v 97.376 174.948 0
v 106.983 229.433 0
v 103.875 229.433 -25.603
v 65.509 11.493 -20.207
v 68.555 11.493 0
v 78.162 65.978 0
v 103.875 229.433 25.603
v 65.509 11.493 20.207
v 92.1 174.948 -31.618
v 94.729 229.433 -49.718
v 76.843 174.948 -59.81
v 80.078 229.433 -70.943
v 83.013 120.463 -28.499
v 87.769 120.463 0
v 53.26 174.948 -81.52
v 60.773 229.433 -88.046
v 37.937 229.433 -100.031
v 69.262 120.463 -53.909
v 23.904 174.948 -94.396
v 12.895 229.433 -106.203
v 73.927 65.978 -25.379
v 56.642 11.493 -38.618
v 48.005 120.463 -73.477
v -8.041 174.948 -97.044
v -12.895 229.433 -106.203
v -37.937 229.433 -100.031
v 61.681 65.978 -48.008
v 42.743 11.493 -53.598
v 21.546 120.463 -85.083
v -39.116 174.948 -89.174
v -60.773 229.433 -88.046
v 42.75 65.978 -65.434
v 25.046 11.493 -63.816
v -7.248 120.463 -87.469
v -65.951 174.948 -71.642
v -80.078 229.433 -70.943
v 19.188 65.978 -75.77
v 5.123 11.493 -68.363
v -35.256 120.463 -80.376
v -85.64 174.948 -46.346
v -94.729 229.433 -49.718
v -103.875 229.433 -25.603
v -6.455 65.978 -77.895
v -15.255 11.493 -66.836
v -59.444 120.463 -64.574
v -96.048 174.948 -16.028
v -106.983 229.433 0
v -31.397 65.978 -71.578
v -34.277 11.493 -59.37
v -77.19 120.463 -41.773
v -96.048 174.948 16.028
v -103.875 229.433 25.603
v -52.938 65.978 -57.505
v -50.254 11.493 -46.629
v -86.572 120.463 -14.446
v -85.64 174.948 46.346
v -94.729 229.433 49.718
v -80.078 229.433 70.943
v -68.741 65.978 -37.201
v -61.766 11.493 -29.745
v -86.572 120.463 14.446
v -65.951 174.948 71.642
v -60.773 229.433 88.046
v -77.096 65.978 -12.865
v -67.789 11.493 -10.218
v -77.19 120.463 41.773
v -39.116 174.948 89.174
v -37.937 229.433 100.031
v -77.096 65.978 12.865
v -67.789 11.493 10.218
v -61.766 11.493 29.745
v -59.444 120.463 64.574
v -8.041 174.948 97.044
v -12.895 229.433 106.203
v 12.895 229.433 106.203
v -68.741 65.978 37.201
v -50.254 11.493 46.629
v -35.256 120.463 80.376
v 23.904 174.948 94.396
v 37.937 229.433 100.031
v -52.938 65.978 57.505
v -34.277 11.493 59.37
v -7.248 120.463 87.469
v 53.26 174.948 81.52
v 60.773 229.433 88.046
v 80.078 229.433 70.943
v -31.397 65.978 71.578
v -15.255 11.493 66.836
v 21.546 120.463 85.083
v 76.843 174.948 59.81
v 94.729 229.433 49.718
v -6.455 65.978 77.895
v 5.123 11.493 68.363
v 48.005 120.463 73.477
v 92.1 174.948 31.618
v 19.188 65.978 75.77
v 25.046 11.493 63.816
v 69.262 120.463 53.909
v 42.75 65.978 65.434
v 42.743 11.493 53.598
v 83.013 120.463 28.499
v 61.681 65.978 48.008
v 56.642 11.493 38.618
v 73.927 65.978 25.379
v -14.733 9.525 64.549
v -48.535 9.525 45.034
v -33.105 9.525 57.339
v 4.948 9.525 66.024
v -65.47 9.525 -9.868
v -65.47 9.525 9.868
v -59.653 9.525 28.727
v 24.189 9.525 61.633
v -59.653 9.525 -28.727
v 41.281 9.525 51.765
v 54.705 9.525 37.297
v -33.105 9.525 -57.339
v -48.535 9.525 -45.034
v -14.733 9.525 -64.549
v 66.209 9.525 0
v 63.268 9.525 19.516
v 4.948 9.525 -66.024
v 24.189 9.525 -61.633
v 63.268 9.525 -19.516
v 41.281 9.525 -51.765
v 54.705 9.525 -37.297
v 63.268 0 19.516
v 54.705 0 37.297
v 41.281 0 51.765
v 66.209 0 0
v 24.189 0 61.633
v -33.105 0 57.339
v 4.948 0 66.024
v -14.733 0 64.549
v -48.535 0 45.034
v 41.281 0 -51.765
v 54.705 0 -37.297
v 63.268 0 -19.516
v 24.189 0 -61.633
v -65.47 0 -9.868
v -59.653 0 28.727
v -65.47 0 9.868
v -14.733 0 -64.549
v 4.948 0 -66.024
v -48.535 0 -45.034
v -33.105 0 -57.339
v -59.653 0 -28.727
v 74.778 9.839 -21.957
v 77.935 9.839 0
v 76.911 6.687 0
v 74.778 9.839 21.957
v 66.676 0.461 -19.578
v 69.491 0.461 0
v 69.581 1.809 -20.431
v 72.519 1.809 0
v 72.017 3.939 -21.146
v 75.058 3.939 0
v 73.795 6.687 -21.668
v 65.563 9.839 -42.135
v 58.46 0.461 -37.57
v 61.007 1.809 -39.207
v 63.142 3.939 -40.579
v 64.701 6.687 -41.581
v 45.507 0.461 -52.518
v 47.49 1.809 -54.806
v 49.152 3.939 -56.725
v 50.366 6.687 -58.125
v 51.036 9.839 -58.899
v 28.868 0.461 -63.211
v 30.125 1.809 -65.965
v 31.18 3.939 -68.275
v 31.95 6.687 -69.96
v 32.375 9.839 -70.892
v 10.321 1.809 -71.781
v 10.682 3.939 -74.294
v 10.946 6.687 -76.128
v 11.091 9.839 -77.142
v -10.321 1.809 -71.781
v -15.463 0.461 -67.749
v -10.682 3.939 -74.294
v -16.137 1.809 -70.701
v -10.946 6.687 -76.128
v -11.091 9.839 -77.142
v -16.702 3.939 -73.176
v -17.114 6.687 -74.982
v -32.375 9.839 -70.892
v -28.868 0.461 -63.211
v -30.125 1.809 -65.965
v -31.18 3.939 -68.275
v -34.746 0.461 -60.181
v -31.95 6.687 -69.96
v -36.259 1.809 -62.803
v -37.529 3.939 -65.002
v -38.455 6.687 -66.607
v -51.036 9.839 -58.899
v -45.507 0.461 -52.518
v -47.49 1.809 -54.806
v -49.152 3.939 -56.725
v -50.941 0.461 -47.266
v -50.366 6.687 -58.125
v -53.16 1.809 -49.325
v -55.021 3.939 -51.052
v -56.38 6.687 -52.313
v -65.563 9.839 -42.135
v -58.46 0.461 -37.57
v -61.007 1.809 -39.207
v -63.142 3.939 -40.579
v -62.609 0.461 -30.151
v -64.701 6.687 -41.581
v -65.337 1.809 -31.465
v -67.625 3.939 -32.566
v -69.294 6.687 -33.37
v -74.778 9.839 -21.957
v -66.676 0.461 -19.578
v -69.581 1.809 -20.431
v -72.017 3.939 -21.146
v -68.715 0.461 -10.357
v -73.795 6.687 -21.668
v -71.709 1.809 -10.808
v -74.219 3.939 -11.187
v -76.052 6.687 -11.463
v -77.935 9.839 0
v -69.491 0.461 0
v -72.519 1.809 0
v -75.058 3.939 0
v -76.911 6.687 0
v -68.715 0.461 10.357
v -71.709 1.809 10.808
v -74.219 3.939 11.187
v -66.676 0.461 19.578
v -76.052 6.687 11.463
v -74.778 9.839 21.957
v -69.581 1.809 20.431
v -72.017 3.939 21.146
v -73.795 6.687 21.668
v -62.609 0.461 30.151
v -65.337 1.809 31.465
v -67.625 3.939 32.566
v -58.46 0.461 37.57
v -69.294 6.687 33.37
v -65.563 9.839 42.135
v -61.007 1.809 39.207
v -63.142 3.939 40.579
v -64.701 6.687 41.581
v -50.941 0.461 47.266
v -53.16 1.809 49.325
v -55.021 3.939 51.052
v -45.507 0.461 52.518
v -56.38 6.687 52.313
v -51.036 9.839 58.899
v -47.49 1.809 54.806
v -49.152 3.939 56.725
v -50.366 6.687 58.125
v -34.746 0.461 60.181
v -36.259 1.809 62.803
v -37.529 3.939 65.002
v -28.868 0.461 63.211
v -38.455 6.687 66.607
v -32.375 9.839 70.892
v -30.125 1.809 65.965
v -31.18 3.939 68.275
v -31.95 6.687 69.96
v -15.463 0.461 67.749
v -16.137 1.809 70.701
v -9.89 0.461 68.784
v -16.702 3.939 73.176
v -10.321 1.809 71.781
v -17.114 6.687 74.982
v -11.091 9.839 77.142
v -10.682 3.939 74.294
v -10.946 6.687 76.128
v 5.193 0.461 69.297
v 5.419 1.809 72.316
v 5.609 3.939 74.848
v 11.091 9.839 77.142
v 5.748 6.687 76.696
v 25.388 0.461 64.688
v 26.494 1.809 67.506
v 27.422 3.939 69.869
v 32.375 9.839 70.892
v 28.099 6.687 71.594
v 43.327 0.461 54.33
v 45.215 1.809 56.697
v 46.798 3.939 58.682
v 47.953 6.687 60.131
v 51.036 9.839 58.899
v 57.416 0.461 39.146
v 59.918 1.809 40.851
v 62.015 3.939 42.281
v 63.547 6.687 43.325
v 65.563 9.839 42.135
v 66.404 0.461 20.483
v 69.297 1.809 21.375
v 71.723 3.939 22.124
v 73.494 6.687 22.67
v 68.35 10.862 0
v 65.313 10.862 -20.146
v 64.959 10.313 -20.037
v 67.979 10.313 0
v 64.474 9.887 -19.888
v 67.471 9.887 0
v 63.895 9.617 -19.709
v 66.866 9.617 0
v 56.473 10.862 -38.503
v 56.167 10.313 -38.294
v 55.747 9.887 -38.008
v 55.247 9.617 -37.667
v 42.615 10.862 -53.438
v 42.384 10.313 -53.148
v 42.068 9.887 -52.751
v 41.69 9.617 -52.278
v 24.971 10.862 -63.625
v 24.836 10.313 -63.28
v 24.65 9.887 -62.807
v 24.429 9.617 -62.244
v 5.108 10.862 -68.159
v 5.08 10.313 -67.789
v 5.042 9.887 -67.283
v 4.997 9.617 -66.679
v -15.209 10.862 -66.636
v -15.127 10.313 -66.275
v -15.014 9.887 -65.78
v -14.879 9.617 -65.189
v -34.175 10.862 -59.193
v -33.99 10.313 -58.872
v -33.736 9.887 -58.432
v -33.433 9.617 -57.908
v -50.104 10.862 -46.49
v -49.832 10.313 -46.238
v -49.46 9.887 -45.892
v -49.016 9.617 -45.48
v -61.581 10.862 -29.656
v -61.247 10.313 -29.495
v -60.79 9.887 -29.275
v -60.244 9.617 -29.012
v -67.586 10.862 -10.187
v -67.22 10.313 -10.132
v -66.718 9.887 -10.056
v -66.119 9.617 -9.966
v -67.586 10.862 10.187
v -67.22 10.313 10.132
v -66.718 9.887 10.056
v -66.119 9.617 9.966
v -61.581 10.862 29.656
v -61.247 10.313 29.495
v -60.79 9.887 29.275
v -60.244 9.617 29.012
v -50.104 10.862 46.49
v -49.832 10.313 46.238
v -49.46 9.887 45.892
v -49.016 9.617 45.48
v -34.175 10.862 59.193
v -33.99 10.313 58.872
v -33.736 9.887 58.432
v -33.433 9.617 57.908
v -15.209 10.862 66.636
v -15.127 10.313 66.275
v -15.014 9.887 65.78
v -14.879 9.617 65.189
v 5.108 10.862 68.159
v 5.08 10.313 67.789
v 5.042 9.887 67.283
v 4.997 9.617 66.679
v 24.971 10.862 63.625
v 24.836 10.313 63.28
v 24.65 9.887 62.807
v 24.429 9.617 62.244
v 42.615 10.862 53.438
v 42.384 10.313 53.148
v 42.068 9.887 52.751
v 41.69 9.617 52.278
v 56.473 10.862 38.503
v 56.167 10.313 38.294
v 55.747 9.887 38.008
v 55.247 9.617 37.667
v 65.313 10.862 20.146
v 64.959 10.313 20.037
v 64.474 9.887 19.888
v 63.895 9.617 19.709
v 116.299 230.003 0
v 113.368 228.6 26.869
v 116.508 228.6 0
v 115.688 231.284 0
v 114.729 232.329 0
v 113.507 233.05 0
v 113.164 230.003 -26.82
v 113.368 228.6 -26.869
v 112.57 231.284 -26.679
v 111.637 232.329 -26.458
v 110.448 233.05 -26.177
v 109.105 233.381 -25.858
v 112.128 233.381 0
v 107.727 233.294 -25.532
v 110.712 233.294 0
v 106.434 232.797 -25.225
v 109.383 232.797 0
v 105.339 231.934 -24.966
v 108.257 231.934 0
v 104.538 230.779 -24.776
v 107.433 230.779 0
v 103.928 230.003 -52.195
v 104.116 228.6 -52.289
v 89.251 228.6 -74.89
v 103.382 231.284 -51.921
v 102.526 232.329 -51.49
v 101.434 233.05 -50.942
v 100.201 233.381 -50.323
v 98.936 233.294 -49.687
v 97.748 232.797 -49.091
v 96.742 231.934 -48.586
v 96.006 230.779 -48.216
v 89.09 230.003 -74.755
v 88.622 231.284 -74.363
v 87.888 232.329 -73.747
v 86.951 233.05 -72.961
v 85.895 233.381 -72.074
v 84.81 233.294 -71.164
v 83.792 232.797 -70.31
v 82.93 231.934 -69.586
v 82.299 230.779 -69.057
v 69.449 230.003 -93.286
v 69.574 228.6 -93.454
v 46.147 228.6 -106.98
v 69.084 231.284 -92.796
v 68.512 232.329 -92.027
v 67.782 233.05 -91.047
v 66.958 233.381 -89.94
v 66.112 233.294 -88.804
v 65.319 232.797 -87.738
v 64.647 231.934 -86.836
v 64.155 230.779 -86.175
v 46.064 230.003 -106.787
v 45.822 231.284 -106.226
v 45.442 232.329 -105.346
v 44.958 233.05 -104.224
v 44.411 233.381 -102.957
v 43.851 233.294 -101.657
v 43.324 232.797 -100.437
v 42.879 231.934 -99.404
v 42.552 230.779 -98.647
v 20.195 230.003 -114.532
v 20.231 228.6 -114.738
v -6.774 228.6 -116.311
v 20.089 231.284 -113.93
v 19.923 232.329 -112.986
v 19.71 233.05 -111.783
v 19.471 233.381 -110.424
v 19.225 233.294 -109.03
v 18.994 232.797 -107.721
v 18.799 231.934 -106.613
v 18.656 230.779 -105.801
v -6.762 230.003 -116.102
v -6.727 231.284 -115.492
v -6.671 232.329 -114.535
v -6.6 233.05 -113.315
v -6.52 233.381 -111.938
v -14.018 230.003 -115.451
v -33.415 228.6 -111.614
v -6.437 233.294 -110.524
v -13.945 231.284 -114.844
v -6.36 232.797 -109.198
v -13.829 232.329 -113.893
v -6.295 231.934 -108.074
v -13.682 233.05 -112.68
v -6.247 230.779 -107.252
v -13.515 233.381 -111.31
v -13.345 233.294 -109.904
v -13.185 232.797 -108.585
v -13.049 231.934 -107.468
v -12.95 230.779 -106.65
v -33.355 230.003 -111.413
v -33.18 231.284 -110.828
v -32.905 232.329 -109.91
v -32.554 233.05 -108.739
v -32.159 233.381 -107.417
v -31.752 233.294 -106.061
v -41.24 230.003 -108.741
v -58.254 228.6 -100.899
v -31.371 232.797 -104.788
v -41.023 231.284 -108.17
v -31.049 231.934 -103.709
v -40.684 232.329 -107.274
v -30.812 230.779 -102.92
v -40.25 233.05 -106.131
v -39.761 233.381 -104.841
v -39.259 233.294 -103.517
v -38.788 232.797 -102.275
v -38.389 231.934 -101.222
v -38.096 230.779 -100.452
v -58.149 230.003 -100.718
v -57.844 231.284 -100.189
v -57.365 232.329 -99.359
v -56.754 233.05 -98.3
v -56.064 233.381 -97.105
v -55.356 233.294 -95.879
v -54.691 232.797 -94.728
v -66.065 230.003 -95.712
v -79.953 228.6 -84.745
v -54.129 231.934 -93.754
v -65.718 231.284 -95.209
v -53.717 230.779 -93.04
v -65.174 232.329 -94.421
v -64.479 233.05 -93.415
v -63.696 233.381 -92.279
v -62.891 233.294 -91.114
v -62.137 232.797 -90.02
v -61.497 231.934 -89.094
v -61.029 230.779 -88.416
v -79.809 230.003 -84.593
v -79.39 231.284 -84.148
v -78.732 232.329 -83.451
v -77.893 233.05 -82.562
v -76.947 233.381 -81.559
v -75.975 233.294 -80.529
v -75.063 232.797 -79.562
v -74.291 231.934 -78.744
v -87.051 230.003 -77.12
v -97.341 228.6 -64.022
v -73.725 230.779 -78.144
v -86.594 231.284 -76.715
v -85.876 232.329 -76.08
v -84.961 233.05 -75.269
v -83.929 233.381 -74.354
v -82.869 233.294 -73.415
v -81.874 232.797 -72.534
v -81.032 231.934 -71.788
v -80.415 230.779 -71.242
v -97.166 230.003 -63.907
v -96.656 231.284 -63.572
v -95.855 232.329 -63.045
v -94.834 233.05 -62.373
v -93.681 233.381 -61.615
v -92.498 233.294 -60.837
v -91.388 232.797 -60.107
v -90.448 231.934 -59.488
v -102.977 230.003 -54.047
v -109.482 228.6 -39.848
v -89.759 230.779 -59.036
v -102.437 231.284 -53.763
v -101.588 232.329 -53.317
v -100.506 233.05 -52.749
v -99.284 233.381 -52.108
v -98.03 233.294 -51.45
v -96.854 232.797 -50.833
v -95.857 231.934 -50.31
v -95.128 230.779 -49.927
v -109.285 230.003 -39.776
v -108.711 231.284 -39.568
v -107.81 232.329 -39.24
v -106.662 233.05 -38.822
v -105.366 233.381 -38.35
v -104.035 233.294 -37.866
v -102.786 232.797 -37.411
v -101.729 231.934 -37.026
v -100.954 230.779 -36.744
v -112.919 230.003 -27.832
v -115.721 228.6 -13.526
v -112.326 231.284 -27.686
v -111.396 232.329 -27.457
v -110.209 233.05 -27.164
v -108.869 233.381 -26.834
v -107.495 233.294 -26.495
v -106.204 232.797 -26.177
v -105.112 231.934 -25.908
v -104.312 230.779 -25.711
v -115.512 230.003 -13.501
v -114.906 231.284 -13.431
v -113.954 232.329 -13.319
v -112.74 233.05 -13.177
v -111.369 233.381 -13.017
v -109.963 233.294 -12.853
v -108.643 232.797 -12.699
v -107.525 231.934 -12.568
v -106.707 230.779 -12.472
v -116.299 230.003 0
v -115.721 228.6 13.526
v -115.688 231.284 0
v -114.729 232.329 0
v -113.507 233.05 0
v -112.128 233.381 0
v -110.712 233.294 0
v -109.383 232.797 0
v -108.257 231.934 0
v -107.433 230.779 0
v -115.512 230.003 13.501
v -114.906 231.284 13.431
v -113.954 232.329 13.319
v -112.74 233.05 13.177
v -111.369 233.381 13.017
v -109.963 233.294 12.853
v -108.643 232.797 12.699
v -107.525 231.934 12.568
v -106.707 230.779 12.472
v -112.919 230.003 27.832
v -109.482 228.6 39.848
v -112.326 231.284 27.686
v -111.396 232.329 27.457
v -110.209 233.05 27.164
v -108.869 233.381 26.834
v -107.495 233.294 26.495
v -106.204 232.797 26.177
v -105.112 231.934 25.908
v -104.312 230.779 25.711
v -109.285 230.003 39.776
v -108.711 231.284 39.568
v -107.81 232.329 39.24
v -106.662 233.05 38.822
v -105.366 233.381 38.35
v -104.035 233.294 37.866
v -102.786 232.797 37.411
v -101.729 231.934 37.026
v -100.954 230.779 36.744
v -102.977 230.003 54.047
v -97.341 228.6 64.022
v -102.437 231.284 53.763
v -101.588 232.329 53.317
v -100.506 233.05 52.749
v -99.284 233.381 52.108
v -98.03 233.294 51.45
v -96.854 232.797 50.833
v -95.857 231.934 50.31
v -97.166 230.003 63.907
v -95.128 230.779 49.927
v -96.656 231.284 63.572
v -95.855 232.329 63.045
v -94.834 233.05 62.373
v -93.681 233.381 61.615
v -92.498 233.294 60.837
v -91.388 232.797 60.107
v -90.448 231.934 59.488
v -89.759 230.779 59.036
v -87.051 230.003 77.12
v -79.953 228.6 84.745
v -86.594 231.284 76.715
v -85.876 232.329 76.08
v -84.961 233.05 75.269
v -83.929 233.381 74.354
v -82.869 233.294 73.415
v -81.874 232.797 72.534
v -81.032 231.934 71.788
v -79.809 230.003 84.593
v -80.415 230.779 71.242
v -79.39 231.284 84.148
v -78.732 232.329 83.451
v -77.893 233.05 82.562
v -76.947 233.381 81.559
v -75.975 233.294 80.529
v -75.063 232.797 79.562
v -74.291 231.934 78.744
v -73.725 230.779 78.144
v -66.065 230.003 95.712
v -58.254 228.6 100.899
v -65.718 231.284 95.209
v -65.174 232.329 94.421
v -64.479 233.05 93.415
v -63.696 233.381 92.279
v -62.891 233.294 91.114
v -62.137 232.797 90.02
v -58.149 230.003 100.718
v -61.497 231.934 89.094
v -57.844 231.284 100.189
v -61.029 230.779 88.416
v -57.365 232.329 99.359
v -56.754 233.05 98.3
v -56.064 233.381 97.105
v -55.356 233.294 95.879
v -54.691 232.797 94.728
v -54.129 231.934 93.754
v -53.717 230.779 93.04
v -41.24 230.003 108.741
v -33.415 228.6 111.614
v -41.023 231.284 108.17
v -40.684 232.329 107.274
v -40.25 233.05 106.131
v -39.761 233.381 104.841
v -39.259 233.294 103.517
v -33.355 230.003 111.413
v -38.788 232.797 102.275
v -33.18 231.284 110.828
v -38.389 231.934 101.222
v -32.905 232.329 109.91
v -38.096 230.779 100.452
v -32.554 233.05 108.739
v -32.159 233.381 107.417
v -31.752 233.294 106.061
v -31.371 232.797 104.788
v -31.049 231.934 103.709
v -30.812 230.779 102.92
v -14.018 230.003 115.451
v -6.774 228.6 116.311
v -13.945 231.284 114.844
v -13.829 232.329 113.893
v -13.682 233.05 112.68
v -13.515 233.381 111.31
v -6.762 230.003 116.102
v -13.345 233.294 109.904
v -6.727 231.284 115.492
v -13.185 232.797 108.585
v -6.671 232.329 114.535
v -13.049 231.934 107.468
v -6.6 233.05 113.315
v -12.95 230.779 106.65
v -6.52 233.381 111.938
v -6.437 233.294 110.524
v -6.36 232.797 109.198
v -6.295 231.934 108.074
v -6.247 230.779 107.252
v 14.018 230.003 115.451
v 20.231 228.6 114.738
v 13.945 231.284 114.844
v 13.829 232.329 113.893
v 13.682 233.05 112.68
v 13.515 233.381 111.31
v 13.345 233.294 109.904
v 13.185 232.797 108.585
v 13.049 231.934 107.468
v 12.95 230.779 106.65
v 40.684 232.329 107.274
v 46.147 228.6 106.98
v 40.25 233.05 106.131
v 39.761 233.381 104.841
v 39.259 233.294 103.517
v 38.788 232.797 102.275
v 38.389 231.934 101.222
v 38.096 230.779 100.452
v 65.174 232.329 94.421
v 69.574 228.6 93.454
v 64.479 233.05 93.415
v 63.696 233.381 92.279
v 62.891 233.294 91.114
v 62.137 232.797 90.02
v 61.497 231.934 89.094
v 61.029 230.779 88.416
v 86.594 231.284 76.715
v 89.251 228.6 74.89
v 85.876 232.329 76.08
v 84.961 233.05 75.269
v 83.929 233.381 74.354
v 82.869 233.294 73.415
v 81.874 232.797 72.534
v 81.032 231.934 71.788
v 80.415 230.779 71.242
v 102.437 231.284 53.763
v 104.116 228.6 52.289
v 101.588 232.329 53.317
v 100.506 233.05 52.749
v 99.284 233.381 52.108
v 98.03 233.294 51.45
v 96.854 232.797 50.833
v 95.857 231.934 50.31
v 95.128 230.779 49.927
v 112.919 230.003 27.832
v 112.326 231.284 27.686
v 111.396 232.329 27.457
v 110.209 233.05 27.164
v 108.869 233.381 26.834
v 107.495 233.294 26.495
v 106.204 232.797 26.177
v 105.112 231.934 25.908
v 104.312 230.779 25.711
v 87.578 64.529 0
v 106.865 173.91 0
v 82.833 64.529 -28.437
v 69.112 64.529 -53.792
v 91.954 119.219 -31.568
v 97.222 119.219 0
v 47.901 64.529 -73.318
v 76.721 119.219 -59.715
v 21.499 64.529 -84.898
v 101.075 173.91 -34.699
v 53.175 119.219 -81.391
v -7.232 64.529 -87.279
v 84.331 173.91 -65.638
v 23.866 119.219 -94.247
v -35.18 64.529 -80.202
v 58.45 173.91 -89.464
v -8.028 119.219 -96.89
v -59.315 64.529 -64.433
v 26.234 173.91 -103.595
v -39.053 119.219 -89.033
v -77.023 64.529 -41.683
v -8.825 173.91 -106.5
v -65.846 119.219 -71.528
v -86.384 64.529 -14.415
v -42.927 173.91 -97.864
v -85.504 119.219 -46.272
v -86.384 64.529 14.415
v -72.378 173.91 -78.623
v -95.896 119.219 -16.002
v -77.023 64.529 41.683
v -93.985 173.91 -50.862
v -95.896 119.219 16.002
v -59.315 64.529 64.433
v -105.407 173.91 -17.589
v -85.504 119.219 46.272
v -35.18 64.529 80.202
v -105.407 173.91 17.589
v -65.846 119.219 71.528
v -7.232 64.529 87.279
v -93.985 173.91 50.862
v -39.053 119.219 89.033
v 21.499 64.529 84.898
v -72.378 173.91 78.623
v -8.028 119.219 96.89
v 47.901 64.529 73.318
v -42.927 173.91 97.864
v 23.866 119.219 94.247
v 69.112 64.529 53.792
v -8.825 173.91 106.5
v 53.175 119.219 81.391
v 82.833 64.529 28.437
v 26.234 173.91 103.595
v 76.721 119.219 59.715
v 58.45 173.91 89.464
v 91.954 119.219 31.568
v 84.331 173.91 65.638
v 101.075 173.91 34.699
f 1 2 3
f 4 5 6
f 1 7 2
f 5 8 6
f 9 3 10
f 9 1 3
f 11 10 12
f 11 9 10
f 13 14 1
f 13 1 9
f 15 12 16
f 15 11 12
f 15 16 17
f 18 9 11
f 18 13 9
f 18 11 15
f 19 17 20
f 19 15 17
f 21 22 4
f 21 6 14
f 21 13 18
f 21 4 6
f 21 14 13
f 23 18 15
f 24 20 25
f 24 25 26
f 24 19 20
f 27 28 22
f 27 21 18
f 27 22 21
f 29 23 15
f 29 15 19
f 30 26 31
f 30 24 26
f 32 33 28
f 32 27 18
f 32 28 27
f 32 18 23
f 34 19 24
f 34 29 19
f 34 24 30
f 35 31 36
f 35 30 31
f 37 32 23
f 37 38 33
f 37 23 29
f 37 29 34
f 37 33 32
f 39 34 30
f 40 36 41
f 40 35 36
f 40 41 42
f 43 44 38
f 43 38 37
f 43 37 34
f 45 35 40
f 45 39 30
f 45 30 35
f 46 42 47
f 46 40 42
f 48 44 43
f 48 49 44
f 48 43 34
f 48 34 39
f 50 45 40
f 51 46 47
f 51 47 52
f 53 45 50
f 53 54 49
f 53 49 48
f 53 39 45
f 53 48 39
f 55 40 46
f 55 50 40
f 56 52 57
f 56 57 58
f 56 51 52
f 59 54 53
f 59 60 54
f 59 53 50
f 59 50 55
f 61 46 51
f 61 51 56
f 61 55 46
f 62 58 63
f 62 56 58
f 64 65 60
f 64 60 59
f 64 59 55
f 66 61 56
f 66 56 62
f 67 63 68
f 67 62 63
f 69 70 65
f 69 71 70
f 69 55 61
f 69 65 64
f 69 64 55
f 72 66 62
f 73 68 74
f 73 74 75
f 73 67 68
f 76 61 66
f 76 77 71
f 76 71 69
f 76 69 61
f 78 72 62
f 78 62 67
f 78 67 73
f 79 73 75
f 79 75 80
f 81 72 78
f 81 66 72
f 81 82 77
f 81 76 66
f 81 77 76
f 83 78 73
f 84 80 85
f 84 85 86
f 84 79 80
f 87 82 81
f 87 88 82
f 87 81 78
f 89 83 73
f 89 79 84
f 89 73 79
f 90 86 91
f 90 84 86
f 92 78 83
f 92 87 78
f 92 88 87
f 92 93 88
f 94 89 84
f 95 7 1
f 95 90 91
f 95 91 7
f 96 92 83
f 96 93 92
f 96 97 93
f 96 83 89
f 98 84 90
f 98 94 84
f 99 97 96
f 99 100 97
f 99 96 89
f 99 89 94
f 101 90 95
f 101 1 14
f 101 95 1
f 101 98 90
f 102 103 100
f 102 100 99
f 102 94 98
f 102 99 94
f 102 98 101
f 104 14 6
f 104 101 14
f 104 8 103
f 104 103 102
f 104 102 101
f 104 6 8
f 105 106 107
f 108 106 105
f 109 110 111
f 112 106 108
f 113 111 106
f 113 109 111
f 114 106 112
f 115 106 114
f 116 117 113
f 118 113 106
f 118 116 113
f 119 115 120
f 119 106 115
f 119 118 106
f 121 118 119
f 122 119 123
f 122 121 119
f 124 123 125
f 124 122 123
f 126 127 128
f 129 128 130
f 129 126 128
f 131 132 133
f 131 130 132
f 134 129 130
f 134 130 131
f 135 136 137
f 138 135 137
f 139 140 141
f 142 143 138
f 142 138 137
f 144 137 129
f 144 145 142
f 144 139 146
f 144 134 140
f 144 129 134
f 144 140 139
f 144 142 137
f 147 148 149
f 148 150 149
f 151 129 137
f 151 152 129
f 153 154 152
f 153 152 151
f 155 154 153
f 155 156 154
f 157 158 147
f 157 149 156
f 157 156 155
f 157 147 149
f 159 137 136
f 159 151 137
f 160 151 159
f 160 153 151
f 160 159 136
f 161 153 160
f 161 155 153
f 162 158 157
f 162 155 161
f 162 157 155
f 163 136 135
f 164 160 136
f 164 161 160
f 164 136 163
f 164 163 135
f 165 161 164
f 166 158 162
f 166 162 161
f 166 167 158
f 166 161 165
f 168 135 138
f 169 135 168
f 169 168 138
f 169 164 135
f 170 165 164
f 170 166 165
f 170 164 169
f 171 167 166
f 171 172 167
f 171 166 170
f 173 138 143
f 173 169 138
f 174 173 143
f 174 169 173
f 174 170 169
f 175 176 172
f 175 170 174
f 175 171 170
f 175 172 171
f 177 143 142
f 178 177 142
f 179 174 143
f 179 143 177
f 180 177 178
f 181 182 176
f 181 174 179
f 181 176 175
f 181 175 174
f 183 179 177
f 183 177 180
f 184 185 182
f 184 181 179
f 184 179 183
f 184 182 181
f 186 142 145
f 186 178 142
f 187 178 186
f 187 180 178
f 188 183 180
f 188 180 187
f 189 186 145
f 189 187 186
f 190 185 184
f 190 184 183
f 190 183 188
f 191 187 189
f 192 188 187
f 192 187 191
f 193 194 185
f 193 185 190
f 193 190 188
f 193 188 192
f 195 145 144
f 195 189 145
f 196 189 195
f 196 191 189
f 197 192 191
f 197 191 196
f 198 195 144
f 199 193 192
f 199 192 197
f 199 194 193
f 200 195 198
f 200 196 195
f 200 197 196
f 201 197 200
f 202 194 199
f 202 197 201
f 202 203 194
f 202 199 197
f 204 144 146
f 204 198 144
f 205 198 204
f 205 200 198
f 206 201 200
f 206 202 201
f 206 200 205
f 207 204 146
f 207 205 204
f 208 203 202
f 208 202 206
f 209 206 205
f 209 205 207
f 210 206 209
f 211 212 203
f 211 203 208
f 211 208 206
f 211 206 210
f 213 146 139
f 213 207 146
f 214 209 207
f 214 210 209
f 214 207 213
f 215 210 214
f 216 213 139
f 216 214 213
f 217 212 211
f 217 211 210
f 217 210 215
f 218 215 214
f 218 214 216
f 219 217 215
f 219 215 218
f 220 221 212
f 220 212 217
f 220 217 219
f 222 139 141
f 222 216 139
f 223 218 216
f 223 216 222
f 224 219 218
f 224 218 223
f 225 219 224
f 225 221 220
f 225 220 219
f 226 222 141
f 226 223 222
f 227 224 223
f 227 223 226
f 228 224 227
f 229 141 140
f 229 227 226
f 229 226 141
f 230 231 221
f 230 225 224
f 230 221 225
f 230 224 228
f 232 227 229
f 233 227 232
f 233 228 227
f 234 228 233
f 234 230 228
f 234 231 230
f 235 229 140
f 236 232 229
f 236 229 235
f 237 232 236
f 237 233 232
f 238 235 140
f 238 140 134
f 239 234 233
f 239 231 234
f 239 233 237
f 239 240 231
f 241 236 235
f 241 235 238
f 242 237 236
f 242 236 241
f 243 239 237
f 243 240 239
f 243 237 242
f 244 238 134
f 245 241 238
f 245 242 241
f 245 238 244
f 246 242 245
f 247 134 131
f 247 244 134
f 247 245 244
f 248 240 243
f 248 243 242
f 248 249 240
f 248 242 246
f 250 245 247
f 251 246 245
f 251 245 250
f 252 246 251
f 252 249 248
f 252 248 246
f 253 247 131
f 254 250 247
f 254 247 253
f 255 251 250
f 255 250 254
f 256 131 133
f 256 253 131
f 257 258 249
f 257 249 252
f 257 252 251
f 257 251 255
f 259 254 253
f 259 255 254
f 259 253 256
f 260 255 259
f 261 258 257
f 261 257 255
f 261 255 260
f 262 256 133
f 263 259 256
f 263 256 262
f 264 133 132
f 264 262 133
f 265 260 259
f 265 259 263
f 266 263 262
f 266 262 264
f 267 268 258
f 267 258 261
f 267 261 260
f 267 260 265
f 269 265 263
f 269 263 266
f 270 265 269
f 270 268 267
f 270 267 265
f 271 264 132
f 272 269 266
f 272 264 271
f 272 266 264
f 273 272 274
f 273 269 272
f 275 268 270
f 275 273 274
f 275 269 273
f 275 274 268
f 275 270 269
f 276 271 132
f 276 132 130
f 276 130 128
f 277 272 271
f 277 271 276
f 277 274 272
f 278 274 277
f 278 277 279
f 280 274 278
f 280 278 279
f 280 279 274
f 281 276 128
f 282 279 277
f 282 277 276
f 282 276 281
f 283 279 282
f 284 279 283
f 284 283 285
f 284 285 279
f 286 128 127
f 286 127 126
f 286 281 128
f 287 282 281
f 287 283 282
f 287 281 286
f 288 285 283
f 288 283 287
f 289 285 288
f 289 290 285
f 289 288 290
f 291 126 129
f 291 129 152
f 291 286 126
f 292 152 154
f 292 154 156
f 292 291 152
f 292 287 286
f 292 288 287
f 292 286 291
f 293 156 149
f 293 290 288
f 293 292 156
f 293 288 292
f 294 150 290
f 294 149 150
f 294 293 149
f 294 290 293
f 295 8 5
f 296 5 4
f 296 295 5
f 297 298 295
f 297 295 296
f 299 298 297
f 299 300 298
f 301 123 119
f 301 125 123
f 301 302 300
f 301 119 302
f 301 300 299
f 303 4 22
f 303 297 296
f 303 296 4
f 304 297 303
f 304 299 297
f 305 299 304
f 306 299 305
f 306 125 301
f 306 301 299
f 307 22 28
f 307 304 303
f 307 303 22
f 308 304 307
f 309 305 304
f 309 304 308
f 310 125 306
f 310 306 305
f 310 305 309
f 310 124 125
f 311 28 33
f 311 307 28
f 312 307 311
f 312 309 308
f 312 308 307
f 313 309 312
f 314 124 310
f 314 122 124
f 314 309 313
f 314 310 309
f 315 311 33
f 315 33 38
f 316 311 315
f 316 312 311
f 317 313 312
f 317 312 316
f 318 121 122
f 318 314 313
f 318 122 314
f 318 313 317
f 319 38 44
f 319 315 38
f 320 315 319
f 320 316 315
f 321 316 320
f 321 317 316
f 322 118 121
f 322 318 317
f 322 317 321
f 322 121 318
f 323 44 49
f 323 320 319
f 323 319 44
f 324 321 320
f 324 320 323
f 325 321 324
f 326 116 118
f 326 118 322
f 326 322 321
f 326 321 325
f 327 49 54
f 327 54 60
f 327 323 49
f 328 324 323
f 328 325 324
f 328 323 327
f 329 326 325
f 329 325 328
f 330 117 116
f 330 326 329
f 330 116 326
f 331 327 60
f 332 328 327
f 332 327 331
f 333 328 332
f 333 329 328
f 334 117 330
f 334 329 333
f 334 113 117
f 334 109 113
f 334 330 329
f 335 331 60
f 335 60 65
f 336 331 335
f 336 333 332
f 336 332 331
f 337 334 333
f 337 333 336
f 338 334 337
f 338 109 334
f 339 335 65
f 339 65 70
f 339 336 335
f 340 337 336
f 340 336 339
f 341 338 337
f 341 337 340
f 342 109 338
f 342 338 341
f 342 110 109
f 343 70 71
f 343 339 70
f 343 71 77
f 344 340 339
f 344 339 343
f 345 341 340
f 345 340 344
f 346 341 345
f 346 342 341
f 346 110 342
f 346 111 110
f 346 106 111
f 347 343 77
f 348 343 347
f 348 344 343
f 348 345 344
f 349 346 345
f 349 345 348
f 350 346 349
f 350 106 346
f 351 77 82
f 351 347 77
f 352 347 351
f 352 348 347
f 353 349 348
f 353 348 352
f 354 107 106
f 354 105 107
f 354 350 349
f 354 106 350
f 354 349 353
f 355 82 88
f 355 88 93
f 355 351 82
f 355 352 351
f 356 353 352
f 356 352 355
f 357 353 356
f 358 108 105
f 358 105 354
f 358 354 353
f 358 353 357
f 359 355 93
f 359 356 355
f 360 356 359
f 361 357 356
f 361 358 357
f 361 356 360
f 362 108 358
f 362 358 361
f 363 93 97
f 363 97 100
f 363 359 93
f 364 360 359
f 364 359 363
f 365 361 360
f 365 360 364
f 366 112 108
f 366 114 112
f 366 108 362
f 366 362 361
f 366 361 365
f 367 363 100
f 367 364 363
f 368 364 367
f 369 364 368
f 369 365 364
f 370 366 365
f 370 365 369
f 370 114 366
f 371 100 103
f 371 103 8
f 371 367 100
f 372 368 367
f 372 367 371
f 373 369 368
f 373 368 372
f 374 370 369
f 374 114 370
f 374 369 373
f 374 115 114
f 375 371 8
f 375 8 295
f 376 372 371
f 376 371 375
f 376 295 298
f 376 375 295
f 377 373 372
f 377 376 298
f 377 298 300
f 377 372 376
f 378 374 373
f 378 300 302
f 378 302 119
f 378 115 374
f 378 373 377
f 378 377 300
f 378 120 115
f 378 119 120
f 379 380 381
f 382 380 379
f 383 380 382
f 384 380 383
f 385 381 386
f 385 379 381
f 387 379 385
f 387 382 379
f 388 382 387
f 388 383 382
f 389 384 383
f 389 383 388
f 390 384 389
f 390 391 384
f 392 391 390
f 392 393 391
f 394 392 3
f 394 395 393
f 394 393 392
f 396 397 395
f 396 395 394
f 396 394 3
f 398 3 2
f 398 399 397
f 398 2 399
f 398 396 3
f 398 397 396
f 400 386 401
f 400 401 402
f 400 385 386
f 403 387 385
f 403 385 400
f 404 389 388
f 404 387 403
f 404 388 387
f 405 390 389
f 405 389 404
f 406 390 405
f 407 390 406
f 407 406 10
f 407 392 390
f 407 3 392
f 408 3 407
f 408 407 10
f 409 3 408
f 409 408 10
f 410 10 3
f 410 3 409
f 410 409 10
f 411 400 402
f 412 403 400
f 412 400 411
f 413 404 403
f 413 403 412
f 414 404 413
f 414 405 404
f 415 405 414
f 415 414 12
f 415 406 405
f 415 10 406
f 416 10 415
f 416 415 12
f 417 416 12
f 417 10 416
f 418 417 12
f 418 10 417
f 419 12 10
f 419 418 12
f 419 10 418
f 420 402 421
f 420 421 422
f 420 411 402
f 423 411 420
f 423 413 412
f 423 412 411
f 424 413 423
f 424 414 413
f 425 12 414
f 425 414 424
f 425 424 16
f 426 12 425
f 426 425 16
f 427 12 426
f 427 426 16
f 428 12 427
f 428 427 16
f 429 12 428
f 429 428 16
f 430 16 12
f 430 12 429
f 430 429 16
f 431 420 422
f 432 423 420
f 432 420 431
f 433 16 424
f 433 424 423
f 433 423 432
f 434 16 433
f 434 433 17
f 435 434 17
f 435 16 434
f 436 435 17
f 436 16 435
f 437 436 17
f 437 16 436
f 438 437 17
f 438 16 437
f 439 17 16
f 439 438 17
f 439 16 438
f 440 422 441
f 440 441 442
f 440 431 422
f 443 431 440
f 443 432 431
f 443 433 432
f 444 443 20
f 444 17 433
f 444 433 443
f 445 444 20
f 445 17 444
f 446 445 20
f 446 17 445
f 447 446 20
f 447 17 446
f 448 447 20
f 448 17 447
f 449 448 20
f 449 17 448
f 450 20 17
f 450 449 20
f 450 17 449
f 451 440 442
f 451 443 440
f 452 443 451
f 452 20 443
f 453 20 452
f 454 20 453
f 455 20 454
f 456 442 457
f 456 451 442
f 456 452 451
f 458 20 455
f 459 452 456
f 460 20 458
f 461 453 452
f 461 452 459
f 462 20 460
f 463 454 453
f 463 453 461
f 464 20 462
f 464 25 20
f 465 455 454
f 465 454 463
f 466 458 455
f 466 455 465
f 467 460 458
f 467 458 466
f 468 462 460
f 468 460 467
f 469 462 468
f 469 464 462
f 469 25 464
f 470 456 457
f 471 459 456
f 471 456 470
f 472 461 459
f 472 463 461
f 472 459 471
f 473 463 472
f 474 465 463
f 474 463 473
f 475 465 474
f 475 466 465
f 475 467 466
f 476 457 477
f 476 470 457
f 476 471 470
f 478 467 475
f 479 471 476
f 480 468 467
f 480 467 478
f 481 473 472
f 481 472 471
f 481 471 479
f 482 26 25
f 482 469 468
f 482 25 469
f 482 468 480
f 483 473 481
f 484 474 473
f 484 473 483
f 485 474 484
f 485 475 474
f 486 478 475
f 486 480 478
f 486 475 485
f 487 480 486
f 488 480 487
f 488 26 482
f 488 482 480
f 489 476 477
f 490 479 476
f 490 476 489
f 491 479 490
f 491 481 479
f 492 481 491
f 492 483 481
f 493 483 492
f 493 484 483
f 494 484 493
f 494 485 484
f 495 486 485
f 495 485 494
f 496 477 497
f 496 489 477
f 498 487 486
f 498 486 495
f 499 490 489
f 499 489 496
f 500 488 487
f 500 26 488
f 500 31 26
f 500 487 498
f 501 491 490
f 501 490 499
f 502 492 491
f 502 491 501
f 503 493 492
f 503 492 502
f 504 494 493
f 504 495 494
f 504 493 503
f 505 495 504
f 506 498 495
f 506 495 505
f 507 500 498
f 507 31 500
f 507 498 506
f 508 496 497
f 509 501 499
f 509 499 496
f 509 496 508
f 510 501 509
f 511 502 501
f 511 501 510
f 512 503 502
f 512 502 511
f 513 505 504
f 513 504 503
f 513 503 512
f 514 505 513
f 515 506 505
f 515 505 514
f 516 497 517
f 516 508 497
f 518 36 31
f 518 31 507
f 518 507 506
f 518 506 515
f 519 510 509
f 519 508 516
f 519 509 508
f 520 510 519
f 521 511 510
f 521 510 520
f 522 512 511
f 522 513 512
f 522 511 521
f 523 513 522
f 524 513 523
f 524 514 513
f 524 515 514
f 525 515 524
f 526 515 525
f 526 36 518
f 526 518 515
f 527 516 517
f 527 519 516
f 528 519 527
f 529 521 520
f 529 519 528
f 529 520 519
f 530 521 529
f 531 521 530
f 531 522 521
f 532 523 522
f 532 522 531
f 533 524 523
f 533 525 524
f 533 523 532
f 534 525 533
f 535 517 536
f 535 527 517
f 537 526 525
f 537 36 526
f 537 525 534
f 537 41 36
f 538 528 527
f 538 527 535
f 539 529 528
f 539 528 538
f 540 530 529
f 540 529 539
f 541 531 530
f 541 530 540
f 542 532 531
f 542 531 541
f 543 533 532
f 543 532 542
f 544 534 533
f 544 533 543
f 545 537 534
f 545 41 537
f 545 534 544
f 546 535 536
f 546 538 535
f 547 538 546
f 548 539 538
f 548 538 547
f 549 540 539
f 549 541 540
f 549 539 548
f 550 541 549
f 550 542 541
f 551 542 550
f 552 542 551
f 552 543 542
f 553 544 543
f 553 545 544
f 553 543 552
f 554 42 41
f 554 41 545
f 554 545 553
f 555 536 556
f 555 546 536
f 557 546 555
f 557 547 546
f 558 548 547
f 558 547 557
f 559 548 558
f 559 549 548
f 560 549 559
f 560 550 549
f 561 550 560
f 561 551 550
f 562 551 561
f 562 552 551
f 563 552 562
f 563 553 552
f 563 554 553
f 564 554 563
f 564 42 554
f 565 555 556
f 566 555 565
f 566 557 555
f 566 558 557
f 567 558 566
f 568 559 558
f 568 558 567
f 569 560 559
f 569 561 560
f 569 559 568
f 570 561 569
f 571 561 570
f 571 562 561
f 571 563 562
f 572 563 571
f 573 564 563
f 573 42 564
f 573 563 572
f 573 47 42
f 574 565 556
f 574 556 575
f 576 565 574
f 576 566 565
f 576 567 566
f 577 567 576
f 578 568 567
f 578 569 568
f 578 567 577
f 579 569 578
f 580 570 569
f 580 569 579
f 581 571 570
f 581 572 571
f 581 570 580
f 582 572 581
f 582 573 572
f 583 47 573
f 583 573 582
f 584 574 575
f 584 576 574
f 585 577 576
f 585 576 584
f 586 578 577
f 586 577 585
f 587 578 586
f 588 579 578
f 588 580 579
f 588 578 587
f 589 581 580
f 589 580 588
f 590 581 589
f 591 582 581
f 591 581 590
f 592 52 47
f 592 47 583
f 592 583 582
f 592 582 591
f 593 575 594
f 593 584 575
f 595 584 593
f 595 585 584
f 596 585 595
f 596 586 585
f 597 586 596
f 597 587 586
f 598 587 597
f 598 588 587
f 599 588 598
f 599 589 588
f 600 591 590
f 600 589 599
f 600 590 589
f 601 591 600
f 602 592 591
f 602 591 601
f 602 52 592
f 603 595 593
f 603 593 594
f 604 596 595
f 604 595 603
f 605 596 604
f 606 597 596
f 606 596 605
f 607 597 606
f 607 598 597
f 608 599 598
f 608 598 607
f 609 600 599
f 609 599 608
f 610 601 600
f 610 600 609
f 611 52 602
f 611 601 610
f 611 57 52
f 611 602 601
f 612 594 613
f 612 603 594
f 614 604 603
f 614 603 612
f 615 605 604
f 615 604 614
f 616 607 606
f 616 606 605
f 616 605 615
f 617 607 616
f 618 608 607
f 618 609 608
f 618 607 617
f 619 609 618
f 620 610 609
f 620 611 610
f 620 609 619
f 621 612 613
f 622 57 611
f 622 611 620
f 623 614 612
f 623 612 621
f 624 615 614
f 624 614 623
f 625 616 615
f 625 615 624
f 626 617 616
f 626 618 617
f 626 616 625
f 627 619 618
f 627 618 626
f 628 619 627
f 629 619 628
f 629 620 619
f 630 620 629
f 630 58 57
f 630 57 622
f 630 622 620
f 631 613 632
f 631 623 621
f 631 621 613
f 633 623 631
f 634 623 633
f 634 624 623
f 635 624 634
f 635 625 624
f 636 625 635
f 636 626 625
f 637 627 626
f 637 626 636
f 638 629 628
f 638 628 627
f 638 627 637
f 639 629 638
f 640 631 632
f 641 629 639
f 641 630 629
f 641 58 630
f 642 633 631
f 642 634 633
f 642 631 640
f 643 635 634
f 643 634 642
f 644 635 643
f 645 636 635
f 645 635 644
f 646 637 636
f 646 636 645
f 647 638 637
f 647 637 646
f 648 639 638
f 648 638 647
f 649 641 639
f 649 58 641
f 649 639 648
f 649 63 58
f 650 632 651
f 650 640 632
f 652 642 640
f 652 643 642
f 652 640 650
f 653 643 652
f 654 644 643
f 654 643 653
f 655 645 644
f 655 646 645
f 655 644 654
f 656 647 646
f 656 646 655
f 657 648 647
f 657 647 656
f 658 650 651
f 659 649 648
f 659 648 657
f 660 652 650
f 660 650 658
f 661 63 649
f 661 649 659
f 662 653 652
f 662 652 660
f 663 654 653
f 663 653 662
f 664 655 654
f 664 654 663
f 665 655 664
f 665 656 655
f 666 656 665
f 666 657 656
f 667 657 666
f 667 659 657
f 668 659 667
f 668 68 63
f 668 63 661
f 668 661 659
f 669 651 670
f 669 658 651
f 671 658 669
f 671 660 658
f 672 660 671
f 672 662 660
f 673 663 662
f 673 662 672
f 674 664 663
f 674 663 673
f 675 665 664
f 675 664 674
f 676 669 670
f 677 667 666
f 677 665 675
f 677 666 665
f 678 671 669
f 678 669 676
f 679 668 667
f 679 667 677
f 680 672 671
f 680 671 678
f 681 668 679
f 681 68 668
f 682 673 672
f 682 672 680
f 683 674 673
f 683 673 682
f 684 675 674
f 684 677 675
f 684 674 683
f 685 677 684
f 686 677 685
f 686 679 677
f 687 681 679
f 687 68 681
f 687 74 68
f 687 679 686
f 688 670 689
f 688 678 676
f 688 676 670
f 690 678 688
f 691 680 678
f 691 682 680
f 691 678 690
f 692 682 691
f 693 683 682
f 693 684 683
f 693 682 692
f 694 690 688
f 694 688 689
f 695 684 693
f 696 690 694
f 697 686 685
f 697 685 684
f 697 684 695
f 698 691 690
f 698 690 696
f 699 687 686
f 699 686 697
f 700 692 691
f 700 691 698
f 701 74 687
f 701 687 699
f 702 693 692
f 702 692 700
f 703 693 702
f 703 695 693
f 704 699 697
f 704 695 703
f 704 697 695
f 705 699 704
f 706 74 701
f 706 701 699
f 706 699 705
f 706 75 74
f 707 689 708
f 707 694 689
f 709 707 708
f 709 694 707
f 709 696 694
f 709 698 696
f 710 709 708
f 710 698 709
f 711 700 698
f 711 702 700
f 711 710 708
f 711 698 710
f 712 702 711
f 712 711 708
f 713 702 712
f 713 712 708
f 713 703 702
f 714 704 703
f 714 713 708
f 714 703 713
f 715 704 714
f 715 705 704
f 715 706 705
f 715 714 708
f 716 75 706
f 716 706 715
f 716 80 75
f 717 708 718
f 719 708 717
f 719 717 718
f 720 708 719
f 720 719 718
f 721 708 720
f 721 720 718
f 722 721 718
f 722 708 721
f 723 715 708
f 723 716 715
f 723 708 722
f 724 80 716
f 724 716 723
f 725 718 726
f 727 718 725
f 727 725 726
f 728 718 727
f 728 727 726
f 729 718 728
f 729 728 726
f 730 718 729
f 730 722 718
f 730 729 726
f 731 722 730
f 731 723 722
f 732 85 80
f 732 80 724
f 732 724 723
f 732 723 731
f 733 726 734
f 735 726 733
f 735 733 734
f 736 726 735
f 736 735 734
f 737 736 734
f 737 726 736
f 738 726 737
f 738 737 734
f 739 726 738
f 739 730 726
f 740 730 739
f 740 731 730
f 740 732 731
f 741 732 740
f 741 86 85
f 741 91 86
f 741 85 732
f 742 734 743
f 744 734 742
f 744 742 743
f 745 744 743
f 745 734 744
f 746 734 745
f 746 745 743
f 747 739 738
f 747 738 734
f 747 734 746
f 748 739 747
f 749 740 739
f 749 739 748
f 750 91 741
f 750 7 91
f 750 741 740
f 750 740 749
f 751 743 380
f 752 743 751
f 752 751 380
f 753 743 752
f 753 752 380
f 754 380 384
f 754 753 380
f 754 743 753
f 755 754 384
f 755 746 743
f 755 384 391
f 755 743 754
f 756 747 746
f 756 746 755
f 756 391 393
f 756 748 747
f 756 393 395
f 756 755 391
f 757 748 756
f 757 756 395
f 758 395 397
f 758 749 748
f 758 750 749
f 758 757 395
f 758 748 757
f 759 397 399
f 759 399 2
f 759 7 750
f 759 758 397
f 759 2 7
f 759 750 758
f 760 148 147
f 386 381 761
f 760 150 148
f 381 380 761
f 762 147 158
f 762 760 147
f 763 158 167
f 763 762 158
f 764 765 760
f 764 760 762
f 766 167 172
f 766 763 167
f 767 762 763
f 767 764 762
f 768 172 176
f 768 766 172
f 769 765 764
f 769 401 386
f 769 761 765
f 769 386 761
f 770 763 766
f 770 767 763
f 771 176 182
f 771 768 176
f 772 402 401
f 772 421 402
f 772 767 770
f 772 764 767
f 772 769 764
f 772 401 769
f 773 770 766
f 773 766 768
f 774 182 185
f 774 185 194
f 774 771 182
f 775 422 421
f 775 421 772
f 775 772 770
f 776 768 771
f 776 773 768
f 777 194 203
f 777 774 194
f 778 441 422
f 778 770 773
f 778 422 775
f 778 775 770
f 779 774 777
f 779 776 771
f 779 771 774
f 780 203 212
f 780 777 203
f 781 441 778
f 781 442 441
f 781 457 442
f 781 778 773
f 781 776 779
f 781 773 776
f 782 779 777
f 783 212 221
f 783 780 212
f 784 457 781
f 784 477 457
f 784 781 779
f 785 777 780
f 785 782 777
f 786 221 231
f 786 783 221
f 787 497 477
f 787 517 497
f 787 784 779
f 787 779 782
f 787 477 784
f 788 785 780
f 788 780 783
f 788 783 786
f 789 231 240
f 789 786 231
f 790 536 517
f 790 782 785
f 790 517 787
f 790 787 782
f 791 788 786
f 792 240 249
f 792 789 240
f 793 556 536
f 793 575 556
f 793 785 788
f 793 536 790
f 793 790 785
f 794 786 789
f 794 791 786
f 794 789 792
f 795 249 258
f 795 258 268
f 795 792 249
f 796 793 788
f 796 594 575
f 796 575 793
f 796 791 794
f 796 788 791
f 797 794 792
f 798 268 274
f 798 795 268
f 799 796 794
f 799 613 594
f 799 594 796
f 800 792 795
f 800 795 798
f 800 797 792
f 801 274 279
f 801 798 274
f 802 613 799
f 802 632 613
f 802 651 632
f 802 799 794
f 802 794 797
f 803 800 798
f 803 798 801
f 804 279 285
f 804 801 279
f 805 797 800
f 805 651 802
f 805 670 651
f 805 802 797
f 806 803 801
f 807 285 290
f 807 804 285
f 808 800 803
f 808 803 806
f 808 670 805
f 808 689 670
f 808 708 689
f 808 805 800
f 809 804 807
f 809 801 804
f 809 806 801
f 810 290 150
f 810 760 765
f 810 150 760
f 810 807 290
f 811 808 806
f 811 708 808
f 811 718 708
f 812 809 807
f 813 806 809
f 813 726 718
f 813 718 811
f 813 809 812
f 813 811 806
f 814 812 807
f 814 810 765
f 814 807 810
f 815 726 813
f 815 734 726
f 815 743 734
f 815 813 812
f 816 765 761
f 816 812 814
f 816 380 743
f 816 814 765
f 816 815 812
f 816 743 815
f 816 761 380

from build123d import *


with BuildPart() as part:
    # Sketch1 → Revolve1 (revolve)
    with BuildSketch(Plane.XY):
        with BuildLine():
            Line((0, 0), (66.209470016, 0))
            ThreePointArc((66.209470016, 0), (73.862659994, 2.785533349), (77.934837326, 9.838751385))
            Line((77.934837326, 9.838751385), (116.50834779, 228.6))
            ThreePointArc((116.50834779, 228.6), (112.127650699, 233.380691976), (106.98334779, 229.43332952))
            Line((106.98334779, 229.43332952), (68.554543478, 11.492750277))
            ThreePointArc((68.554543478, 11.492750277), (67.740108012, 10.08210667), (66.209470016, 9.525))
            Line((66.209470016, 9.525), (0, 9.525))
            Line((0, 9.525), (0, 0))
        make_face()
    revolve(axis=Axis((0, 0, 0), (0, 1, 0)))


solid = part.part
